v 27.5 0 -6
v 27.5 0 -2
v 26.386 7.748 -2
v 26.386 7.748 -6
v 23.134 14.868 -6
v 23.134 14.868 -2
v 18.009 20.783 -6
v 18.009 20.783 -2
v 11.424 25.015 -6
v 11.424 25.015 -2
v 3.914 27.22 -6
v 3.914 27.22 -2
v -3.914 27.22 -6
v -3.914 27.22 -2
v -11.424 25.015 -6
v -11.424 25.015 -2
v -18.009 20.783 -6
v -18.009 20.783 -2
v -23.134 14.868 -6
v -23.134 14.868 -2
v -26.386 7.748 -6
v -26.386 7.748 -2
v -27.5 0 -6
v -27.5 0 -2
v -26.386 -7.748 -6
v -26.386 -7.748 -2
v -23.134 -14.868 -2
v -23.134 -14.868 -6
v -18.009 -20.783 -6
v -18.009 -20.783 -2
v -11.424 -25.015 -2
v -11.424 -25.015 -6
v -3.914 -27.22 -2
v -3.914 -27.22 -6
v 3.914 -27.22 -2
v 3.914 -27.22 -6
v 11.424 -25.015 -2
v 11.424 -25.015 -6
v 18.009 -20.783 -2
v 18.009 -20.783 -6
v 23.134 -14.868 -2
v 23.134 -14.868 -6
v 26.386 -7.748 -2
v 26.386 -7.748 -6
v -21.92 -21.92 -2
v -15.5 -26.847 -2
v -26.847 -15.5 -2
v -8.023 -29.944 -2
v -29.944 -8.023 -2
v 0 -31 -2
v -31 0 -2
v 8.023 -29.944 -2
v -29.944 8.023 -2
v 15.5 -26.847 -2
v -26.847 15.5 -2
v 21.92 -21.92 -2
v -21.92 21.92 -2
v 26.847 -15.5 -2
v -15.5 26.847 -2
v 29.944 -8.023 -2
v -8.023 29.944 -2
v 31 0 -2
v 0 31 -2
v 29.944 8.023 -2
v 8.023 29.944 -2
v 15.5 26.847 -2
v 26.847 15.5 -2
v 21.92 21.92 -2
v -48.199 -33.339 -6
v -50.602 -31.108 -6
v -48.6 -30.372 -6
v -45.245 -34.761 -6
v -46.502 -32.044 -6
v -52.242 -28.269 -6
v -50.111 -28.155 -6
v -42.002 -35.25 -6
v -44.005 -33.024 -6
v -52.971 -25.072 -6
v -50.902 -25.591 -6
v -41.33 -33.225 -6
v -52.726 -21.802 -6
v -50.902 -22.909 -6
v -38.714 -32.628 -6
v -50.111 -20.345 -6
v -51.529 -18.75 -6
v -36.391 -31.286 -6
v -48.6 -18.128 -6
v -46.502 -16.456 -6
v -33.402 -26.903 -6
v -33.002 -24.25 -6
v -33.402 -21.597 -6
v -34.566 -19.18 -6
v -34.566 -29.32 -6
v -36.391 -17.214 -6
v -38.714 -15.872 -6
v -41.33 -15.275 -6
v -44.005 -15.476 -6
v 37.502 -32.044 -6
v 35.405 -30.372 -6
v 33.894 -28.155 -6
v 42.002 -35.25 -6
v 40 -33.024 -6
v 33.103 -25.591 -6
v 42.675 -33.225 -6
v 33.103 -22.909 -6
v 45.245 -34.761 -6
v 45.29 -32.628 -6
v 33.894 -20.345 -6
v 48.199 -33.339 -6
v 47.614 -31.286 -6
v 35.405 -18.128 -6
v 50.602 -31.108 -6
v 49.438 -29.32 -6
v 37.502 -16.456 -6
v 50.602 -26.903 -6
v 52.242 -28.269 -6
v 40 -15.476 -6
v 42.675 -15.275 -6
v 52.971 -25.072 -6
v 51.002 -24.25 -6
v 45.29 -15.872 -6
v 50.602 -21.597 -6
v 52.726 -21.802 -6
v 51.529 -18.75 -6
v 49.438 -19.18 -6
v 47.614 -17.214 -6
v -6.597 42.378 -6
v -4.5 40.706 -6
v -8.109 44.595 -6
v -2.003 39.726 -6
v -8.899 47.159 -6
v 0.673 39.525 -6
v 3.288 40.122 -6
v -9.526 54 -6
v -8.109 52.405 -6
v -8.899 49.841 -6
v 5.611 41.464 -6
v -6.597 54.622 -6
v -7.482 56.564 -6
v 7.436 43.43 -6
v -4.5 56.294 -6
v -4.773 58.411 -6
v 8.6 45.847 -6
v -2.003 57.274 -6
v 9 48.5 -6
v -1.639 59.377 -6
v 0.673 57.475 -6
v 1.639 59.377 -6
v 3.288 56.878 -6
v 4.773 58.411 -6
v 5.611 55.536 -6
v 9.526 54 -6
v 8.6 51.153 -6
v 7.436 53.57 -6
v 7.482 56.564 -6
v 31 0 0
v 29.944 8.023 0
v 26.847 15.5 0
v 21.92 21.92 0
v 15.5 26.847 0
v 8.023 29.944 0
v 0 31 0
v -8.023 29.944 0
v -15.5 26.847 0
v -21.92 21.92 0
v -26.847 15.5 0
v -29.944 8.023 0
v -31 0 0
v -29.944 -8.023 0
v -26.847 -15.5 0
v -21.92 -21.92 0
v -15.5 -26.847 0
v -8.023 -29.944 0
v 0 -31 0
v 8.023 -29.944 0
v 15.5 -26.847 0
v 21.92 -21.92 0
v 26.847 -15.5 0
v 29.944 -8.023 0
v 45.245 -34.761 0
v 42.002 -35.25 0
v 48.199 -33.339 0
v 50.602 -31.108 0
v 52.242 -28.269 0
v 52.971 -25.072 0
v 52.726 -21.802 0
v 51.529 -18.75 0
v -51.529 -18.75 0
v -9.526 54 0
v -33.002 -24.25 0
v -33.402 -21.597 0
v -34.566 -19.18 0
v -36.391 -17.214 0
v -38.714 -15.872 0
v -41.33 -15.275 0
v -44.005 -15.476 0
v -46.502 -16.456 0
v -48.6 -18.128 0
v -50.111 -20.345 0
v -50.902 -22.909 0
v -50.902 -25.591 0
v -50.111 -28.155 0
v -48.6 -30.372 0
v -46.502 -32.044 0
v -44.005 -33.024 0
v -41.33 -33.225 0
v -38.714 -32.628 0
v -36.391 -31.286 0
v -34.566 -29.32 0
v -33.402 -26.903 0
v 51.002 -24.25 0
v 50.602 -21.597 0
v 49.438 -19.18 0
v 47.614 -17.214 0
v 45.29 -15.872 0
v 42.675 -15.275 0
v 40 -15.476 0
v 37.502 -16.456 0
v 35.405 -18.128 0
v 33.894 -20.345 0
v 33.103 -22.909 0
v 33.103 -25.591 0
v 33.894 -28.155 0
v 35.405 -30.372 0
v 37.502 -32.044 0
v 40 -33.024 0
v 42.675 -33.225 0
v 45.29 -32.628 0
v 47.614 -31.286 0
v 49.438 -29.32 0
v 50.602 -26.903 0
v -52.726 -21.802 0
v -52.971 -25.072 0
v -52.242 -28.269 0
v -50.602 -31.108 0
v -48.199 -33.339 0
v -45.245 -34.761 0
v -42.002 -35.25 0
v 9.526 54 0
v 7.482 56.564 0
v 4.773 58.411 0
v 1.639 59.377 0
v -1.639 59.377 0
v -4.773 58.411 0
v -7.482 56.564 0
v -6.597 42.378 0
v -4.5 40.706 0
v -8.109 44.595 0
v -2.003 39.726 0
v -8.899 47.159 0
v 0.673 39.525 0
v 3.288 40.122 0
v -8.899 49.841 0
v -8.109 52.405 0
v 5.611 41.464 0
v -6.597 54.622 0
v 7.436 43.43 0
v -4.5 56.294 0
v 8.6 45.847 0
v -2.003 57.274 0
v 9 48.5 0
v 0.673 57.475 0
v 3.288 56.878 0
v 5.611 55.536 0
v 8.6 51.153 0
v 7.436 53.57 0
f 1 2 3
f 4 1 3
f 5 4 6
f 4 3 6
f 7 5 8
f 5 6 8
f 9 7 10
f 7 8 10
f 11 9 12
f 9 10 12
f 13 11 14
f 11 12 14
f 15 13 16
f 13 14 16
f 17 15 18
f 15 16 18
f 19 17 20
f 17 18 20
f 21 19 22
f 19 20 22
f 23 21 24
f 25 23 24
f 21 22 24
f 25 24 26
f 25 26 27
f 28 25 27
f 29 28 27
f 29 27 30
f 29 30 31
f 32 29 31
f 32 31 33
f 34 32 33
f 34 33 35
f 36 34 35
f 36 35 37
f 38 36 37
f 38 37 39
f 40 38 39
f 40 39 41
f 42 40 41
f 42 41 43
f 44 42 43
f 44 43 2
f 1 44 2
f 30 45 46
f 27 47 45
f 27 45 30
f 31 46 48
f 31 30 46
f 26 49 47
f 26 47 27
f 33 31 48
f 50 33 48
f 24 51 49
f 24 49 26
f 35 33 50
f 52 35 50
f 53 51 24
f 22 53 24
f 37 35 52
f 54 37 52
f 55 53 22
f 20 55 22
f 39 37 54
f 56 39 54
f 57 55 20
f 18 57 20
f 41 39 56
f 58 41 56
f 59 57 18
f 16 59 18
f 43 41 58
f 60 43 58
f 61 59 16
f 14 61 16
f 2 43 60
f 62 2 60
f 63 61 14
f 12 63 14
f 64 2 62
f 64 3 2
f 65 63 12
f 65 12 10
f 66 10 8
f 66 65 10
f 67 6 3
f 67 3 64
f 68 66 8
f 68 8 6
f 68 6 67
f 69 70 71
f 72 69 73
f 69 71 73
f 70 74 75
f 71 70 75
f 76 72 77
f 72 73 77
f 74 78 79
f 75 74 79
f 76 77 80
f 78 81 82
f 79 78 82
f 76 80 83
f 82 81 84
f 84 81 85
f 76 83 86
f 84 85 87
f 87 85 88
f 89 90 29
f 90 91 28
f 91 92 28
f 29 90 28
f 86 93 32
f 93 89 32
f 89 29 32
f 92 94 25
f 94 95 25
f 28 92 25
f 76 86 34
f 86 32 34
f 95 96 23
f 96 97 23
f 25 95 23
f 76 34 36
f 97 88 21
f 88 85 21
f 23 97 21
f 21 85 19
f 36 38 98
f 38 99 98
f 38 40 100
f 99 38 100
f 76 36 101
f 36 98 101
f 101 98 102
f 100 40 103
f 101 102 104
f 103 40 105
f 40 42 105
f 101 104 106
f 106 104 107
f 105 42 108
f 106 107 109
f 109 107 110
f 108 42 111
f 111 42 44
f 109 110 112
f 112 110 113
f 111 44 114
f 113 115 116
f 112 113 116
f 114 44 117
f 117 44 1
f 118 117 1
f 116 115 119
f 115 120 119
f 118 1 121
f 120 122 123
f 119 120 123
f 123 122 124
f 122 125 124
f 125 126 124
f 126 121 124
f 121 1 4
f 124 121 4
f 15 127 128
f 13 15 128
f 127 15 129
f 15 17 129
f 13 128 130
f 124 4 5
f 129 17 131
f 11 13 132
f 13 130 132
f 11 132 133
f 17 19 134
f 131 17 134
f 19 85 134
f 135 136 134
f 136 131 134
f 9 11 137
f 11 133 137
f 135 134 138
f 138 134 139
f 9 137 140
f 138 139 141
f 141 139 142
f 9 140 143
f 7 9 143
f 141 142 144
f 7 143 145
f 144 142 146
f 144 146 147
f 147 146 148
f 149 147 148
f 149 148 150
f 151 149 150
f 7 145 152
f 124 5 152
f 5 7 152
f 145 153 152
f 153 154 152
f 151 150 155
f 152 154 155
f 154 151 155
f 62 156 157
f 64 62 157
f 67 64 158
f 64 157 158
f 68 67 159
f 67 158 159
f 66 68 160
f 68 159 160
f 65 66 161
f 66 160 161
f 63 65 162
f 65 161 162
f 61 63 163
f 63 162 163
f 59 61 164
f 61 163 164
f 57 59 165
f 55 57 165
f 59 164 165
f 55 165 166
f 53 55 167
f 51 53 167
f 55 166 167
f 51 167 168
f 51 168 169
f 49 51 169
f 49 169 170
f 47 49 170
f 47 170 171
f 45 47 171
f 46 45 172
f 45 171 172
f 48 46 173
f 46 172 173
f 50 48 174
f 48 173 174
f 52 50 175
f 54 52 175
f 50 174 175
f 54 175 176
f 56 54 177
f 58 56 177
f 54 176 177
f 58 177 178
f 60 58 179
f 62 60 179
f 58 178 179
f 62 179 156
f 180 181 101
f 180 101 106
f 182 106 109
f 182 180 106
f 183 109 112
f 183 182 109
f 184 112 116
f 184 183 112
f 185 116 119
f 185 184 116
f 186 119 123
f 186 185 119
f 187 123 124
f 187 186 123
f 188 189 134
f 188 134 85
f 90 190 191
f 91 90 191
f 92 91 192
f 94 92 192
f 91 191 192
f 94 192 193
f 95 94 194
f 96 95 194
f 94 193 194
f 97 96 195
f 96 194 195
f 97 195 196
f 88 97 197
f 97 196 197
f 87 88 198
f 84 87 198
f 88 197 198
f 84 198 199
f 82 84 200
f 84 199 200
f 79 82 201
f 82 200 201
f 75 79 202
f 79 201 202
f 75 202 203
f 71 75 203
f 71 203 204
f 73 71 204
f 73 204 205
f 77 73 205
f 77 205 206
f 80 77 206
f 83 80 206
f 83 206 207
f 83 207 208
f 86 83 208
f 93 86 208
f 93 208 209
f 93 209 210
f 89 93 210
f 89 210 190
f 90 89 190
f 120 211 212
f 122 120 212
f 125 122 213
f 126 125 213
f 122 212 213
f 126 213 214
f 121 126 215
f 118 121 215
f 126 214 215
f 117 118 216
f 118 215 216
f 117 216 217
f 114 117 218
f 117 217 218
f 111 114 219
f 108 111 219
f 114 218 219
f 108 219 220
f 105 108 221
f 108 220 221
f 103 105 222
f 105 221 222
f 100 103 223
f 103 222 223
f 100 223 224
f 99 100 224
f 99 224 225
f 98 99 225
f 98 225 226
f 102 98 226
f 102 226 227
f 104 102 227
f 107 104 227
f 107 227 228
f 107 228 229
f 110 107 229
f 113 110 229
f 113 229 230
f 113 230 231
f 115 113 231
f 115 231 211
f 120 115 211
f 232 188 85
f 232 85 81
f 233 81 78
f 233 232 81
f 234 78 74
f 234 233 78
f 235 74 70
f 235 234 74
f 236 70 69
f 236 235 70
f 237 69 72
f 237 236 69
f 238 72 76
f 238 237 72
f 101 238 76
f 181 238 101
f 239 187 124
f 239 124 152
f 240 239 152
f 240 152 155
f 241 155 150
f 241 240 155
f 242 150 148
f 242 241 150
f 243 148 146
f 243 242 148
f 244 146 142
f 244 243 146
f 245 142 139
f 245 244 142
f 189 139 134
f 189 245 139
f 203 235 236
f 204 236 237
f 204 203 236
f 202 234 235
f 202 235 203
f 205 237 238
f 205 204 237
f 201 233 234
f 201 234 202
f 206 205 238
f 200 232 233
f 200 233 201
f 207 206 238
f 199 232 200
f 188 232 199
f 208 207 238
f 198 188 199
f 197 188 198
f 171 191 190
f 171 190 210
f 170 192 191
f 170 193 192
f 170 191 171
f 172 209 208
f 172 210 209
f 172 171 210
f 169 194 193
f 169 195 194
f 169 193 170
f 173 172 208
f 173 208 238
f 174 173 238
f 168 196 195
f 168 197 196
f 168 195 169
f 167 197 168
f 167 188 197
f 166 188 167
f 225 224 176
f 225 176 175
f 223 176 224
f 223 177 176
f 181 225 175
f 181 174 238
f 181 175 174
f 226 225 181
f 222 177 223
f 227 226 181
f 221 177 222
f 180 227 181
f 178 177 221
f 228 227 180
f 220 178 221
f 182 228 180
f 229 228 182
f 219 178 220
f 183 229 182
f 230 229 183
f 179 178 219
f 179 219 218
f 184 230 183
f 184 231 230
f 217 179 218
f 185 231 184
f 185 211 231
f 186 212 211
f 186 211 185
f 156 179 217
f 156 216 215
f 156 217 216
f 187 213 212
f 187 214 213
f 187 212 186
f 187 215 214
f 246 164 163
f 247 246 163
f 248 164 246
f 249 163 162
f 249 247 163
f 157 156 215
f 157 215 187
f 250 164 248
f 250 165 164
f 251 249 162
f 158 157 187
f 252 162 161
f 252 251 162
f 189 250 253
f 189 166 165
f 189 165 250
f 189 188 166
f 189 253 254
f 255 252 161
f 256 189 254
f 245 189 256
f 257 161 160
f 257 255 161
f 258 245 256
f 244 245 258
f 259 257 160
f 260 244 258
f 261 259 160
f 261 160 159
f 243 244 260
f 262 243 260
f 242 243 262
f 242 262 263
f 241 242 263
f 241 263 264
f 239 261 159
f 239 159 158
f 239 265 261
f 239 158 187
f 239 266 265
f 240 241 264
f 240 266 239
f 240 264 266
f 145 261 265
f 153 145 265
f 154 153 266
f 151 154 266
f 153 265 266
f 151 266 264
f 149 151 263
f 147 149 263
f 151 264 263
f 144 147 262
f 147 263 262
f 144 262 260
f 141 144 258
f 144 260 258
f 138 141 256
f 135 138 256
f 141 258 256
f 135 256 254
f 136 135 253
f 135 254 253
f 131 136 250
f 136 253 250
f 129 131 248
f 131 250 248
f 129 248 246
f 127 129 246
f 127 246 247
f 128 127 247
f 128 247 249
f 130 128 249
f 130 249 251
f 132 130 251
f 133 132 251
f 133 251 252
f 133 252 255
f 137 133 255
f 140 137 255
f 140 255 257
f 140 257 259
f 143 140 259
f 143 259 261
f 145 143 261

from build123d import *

# Parameters (mm, degrees)
PAD001_DEPTH    = 6
CLONE2D004_R    = 9
CLONE2D004_R_2  = 4
POCKET004_DEPTH = 6.001
SKETCH009_R     = 27.5
POCKET005_DEPTH = 6.001
SKETCH010_R     = 31
POCKET006_DEPTH = 2


with BuildPart() as part:
    # Clone2D003 → Pad001 (new body)
    with BuildSketch(Plane.XY):
        with BuildLine():
            ThreePointArc((9.526279, 54), (0, 59.5), (-9.526279, 54))
            Line((-9.526279, 54), (-51.528512, -18.75))
            ThreePointArc((-51.528512, -18.75), (-51.528512, -29.75), (-42.002232, -35.25))
            Line((-42.002232, -35.25), (42.002232, -35.25))
            ThreePointArc((42.002232, -35.25), (51.528512, -29.75), (51.528512, -18.75))
            Line((51.528512, -18.75), (9.526279, 54))
        make_face()
    extrude(amount=-PAD001_DEPTH)

    # Clone2D004 → Pocket004 (cut, through all)
    with BuildSketch(Plane.XY):
        with Locations((0, 48.5)):
            Circle(CLONE2D004_R)
        with Locations((-42.002232, -24.25)):
            Circle(CLONE2D004_R)
        with Locations((42.002232, -24.25)):
            Circle(CLONE2D004_R)
        Circle(CLONE2D004_R_2)
    extrude(amount=-POCKET004_DEPTH, mode=Mode.SUBTRACT)

    # Sketch009 → Pocket005 (cut, through all)
    with BuildSketch(Plane.XY):
        Circle(SKETCH009_R)
    extrude(amount=-POCKET005_DEPTH, mode=Mode.SUBTRACT)

    # Sketch010 → Pocket006 (cut)
    with BuildSketch(Plane.XY):
        Circle(SKETCH010_R)
    extrude(amount=-POCKET006_DEPTH, mode=Mode.SUBTRACT)


solid = part.part
